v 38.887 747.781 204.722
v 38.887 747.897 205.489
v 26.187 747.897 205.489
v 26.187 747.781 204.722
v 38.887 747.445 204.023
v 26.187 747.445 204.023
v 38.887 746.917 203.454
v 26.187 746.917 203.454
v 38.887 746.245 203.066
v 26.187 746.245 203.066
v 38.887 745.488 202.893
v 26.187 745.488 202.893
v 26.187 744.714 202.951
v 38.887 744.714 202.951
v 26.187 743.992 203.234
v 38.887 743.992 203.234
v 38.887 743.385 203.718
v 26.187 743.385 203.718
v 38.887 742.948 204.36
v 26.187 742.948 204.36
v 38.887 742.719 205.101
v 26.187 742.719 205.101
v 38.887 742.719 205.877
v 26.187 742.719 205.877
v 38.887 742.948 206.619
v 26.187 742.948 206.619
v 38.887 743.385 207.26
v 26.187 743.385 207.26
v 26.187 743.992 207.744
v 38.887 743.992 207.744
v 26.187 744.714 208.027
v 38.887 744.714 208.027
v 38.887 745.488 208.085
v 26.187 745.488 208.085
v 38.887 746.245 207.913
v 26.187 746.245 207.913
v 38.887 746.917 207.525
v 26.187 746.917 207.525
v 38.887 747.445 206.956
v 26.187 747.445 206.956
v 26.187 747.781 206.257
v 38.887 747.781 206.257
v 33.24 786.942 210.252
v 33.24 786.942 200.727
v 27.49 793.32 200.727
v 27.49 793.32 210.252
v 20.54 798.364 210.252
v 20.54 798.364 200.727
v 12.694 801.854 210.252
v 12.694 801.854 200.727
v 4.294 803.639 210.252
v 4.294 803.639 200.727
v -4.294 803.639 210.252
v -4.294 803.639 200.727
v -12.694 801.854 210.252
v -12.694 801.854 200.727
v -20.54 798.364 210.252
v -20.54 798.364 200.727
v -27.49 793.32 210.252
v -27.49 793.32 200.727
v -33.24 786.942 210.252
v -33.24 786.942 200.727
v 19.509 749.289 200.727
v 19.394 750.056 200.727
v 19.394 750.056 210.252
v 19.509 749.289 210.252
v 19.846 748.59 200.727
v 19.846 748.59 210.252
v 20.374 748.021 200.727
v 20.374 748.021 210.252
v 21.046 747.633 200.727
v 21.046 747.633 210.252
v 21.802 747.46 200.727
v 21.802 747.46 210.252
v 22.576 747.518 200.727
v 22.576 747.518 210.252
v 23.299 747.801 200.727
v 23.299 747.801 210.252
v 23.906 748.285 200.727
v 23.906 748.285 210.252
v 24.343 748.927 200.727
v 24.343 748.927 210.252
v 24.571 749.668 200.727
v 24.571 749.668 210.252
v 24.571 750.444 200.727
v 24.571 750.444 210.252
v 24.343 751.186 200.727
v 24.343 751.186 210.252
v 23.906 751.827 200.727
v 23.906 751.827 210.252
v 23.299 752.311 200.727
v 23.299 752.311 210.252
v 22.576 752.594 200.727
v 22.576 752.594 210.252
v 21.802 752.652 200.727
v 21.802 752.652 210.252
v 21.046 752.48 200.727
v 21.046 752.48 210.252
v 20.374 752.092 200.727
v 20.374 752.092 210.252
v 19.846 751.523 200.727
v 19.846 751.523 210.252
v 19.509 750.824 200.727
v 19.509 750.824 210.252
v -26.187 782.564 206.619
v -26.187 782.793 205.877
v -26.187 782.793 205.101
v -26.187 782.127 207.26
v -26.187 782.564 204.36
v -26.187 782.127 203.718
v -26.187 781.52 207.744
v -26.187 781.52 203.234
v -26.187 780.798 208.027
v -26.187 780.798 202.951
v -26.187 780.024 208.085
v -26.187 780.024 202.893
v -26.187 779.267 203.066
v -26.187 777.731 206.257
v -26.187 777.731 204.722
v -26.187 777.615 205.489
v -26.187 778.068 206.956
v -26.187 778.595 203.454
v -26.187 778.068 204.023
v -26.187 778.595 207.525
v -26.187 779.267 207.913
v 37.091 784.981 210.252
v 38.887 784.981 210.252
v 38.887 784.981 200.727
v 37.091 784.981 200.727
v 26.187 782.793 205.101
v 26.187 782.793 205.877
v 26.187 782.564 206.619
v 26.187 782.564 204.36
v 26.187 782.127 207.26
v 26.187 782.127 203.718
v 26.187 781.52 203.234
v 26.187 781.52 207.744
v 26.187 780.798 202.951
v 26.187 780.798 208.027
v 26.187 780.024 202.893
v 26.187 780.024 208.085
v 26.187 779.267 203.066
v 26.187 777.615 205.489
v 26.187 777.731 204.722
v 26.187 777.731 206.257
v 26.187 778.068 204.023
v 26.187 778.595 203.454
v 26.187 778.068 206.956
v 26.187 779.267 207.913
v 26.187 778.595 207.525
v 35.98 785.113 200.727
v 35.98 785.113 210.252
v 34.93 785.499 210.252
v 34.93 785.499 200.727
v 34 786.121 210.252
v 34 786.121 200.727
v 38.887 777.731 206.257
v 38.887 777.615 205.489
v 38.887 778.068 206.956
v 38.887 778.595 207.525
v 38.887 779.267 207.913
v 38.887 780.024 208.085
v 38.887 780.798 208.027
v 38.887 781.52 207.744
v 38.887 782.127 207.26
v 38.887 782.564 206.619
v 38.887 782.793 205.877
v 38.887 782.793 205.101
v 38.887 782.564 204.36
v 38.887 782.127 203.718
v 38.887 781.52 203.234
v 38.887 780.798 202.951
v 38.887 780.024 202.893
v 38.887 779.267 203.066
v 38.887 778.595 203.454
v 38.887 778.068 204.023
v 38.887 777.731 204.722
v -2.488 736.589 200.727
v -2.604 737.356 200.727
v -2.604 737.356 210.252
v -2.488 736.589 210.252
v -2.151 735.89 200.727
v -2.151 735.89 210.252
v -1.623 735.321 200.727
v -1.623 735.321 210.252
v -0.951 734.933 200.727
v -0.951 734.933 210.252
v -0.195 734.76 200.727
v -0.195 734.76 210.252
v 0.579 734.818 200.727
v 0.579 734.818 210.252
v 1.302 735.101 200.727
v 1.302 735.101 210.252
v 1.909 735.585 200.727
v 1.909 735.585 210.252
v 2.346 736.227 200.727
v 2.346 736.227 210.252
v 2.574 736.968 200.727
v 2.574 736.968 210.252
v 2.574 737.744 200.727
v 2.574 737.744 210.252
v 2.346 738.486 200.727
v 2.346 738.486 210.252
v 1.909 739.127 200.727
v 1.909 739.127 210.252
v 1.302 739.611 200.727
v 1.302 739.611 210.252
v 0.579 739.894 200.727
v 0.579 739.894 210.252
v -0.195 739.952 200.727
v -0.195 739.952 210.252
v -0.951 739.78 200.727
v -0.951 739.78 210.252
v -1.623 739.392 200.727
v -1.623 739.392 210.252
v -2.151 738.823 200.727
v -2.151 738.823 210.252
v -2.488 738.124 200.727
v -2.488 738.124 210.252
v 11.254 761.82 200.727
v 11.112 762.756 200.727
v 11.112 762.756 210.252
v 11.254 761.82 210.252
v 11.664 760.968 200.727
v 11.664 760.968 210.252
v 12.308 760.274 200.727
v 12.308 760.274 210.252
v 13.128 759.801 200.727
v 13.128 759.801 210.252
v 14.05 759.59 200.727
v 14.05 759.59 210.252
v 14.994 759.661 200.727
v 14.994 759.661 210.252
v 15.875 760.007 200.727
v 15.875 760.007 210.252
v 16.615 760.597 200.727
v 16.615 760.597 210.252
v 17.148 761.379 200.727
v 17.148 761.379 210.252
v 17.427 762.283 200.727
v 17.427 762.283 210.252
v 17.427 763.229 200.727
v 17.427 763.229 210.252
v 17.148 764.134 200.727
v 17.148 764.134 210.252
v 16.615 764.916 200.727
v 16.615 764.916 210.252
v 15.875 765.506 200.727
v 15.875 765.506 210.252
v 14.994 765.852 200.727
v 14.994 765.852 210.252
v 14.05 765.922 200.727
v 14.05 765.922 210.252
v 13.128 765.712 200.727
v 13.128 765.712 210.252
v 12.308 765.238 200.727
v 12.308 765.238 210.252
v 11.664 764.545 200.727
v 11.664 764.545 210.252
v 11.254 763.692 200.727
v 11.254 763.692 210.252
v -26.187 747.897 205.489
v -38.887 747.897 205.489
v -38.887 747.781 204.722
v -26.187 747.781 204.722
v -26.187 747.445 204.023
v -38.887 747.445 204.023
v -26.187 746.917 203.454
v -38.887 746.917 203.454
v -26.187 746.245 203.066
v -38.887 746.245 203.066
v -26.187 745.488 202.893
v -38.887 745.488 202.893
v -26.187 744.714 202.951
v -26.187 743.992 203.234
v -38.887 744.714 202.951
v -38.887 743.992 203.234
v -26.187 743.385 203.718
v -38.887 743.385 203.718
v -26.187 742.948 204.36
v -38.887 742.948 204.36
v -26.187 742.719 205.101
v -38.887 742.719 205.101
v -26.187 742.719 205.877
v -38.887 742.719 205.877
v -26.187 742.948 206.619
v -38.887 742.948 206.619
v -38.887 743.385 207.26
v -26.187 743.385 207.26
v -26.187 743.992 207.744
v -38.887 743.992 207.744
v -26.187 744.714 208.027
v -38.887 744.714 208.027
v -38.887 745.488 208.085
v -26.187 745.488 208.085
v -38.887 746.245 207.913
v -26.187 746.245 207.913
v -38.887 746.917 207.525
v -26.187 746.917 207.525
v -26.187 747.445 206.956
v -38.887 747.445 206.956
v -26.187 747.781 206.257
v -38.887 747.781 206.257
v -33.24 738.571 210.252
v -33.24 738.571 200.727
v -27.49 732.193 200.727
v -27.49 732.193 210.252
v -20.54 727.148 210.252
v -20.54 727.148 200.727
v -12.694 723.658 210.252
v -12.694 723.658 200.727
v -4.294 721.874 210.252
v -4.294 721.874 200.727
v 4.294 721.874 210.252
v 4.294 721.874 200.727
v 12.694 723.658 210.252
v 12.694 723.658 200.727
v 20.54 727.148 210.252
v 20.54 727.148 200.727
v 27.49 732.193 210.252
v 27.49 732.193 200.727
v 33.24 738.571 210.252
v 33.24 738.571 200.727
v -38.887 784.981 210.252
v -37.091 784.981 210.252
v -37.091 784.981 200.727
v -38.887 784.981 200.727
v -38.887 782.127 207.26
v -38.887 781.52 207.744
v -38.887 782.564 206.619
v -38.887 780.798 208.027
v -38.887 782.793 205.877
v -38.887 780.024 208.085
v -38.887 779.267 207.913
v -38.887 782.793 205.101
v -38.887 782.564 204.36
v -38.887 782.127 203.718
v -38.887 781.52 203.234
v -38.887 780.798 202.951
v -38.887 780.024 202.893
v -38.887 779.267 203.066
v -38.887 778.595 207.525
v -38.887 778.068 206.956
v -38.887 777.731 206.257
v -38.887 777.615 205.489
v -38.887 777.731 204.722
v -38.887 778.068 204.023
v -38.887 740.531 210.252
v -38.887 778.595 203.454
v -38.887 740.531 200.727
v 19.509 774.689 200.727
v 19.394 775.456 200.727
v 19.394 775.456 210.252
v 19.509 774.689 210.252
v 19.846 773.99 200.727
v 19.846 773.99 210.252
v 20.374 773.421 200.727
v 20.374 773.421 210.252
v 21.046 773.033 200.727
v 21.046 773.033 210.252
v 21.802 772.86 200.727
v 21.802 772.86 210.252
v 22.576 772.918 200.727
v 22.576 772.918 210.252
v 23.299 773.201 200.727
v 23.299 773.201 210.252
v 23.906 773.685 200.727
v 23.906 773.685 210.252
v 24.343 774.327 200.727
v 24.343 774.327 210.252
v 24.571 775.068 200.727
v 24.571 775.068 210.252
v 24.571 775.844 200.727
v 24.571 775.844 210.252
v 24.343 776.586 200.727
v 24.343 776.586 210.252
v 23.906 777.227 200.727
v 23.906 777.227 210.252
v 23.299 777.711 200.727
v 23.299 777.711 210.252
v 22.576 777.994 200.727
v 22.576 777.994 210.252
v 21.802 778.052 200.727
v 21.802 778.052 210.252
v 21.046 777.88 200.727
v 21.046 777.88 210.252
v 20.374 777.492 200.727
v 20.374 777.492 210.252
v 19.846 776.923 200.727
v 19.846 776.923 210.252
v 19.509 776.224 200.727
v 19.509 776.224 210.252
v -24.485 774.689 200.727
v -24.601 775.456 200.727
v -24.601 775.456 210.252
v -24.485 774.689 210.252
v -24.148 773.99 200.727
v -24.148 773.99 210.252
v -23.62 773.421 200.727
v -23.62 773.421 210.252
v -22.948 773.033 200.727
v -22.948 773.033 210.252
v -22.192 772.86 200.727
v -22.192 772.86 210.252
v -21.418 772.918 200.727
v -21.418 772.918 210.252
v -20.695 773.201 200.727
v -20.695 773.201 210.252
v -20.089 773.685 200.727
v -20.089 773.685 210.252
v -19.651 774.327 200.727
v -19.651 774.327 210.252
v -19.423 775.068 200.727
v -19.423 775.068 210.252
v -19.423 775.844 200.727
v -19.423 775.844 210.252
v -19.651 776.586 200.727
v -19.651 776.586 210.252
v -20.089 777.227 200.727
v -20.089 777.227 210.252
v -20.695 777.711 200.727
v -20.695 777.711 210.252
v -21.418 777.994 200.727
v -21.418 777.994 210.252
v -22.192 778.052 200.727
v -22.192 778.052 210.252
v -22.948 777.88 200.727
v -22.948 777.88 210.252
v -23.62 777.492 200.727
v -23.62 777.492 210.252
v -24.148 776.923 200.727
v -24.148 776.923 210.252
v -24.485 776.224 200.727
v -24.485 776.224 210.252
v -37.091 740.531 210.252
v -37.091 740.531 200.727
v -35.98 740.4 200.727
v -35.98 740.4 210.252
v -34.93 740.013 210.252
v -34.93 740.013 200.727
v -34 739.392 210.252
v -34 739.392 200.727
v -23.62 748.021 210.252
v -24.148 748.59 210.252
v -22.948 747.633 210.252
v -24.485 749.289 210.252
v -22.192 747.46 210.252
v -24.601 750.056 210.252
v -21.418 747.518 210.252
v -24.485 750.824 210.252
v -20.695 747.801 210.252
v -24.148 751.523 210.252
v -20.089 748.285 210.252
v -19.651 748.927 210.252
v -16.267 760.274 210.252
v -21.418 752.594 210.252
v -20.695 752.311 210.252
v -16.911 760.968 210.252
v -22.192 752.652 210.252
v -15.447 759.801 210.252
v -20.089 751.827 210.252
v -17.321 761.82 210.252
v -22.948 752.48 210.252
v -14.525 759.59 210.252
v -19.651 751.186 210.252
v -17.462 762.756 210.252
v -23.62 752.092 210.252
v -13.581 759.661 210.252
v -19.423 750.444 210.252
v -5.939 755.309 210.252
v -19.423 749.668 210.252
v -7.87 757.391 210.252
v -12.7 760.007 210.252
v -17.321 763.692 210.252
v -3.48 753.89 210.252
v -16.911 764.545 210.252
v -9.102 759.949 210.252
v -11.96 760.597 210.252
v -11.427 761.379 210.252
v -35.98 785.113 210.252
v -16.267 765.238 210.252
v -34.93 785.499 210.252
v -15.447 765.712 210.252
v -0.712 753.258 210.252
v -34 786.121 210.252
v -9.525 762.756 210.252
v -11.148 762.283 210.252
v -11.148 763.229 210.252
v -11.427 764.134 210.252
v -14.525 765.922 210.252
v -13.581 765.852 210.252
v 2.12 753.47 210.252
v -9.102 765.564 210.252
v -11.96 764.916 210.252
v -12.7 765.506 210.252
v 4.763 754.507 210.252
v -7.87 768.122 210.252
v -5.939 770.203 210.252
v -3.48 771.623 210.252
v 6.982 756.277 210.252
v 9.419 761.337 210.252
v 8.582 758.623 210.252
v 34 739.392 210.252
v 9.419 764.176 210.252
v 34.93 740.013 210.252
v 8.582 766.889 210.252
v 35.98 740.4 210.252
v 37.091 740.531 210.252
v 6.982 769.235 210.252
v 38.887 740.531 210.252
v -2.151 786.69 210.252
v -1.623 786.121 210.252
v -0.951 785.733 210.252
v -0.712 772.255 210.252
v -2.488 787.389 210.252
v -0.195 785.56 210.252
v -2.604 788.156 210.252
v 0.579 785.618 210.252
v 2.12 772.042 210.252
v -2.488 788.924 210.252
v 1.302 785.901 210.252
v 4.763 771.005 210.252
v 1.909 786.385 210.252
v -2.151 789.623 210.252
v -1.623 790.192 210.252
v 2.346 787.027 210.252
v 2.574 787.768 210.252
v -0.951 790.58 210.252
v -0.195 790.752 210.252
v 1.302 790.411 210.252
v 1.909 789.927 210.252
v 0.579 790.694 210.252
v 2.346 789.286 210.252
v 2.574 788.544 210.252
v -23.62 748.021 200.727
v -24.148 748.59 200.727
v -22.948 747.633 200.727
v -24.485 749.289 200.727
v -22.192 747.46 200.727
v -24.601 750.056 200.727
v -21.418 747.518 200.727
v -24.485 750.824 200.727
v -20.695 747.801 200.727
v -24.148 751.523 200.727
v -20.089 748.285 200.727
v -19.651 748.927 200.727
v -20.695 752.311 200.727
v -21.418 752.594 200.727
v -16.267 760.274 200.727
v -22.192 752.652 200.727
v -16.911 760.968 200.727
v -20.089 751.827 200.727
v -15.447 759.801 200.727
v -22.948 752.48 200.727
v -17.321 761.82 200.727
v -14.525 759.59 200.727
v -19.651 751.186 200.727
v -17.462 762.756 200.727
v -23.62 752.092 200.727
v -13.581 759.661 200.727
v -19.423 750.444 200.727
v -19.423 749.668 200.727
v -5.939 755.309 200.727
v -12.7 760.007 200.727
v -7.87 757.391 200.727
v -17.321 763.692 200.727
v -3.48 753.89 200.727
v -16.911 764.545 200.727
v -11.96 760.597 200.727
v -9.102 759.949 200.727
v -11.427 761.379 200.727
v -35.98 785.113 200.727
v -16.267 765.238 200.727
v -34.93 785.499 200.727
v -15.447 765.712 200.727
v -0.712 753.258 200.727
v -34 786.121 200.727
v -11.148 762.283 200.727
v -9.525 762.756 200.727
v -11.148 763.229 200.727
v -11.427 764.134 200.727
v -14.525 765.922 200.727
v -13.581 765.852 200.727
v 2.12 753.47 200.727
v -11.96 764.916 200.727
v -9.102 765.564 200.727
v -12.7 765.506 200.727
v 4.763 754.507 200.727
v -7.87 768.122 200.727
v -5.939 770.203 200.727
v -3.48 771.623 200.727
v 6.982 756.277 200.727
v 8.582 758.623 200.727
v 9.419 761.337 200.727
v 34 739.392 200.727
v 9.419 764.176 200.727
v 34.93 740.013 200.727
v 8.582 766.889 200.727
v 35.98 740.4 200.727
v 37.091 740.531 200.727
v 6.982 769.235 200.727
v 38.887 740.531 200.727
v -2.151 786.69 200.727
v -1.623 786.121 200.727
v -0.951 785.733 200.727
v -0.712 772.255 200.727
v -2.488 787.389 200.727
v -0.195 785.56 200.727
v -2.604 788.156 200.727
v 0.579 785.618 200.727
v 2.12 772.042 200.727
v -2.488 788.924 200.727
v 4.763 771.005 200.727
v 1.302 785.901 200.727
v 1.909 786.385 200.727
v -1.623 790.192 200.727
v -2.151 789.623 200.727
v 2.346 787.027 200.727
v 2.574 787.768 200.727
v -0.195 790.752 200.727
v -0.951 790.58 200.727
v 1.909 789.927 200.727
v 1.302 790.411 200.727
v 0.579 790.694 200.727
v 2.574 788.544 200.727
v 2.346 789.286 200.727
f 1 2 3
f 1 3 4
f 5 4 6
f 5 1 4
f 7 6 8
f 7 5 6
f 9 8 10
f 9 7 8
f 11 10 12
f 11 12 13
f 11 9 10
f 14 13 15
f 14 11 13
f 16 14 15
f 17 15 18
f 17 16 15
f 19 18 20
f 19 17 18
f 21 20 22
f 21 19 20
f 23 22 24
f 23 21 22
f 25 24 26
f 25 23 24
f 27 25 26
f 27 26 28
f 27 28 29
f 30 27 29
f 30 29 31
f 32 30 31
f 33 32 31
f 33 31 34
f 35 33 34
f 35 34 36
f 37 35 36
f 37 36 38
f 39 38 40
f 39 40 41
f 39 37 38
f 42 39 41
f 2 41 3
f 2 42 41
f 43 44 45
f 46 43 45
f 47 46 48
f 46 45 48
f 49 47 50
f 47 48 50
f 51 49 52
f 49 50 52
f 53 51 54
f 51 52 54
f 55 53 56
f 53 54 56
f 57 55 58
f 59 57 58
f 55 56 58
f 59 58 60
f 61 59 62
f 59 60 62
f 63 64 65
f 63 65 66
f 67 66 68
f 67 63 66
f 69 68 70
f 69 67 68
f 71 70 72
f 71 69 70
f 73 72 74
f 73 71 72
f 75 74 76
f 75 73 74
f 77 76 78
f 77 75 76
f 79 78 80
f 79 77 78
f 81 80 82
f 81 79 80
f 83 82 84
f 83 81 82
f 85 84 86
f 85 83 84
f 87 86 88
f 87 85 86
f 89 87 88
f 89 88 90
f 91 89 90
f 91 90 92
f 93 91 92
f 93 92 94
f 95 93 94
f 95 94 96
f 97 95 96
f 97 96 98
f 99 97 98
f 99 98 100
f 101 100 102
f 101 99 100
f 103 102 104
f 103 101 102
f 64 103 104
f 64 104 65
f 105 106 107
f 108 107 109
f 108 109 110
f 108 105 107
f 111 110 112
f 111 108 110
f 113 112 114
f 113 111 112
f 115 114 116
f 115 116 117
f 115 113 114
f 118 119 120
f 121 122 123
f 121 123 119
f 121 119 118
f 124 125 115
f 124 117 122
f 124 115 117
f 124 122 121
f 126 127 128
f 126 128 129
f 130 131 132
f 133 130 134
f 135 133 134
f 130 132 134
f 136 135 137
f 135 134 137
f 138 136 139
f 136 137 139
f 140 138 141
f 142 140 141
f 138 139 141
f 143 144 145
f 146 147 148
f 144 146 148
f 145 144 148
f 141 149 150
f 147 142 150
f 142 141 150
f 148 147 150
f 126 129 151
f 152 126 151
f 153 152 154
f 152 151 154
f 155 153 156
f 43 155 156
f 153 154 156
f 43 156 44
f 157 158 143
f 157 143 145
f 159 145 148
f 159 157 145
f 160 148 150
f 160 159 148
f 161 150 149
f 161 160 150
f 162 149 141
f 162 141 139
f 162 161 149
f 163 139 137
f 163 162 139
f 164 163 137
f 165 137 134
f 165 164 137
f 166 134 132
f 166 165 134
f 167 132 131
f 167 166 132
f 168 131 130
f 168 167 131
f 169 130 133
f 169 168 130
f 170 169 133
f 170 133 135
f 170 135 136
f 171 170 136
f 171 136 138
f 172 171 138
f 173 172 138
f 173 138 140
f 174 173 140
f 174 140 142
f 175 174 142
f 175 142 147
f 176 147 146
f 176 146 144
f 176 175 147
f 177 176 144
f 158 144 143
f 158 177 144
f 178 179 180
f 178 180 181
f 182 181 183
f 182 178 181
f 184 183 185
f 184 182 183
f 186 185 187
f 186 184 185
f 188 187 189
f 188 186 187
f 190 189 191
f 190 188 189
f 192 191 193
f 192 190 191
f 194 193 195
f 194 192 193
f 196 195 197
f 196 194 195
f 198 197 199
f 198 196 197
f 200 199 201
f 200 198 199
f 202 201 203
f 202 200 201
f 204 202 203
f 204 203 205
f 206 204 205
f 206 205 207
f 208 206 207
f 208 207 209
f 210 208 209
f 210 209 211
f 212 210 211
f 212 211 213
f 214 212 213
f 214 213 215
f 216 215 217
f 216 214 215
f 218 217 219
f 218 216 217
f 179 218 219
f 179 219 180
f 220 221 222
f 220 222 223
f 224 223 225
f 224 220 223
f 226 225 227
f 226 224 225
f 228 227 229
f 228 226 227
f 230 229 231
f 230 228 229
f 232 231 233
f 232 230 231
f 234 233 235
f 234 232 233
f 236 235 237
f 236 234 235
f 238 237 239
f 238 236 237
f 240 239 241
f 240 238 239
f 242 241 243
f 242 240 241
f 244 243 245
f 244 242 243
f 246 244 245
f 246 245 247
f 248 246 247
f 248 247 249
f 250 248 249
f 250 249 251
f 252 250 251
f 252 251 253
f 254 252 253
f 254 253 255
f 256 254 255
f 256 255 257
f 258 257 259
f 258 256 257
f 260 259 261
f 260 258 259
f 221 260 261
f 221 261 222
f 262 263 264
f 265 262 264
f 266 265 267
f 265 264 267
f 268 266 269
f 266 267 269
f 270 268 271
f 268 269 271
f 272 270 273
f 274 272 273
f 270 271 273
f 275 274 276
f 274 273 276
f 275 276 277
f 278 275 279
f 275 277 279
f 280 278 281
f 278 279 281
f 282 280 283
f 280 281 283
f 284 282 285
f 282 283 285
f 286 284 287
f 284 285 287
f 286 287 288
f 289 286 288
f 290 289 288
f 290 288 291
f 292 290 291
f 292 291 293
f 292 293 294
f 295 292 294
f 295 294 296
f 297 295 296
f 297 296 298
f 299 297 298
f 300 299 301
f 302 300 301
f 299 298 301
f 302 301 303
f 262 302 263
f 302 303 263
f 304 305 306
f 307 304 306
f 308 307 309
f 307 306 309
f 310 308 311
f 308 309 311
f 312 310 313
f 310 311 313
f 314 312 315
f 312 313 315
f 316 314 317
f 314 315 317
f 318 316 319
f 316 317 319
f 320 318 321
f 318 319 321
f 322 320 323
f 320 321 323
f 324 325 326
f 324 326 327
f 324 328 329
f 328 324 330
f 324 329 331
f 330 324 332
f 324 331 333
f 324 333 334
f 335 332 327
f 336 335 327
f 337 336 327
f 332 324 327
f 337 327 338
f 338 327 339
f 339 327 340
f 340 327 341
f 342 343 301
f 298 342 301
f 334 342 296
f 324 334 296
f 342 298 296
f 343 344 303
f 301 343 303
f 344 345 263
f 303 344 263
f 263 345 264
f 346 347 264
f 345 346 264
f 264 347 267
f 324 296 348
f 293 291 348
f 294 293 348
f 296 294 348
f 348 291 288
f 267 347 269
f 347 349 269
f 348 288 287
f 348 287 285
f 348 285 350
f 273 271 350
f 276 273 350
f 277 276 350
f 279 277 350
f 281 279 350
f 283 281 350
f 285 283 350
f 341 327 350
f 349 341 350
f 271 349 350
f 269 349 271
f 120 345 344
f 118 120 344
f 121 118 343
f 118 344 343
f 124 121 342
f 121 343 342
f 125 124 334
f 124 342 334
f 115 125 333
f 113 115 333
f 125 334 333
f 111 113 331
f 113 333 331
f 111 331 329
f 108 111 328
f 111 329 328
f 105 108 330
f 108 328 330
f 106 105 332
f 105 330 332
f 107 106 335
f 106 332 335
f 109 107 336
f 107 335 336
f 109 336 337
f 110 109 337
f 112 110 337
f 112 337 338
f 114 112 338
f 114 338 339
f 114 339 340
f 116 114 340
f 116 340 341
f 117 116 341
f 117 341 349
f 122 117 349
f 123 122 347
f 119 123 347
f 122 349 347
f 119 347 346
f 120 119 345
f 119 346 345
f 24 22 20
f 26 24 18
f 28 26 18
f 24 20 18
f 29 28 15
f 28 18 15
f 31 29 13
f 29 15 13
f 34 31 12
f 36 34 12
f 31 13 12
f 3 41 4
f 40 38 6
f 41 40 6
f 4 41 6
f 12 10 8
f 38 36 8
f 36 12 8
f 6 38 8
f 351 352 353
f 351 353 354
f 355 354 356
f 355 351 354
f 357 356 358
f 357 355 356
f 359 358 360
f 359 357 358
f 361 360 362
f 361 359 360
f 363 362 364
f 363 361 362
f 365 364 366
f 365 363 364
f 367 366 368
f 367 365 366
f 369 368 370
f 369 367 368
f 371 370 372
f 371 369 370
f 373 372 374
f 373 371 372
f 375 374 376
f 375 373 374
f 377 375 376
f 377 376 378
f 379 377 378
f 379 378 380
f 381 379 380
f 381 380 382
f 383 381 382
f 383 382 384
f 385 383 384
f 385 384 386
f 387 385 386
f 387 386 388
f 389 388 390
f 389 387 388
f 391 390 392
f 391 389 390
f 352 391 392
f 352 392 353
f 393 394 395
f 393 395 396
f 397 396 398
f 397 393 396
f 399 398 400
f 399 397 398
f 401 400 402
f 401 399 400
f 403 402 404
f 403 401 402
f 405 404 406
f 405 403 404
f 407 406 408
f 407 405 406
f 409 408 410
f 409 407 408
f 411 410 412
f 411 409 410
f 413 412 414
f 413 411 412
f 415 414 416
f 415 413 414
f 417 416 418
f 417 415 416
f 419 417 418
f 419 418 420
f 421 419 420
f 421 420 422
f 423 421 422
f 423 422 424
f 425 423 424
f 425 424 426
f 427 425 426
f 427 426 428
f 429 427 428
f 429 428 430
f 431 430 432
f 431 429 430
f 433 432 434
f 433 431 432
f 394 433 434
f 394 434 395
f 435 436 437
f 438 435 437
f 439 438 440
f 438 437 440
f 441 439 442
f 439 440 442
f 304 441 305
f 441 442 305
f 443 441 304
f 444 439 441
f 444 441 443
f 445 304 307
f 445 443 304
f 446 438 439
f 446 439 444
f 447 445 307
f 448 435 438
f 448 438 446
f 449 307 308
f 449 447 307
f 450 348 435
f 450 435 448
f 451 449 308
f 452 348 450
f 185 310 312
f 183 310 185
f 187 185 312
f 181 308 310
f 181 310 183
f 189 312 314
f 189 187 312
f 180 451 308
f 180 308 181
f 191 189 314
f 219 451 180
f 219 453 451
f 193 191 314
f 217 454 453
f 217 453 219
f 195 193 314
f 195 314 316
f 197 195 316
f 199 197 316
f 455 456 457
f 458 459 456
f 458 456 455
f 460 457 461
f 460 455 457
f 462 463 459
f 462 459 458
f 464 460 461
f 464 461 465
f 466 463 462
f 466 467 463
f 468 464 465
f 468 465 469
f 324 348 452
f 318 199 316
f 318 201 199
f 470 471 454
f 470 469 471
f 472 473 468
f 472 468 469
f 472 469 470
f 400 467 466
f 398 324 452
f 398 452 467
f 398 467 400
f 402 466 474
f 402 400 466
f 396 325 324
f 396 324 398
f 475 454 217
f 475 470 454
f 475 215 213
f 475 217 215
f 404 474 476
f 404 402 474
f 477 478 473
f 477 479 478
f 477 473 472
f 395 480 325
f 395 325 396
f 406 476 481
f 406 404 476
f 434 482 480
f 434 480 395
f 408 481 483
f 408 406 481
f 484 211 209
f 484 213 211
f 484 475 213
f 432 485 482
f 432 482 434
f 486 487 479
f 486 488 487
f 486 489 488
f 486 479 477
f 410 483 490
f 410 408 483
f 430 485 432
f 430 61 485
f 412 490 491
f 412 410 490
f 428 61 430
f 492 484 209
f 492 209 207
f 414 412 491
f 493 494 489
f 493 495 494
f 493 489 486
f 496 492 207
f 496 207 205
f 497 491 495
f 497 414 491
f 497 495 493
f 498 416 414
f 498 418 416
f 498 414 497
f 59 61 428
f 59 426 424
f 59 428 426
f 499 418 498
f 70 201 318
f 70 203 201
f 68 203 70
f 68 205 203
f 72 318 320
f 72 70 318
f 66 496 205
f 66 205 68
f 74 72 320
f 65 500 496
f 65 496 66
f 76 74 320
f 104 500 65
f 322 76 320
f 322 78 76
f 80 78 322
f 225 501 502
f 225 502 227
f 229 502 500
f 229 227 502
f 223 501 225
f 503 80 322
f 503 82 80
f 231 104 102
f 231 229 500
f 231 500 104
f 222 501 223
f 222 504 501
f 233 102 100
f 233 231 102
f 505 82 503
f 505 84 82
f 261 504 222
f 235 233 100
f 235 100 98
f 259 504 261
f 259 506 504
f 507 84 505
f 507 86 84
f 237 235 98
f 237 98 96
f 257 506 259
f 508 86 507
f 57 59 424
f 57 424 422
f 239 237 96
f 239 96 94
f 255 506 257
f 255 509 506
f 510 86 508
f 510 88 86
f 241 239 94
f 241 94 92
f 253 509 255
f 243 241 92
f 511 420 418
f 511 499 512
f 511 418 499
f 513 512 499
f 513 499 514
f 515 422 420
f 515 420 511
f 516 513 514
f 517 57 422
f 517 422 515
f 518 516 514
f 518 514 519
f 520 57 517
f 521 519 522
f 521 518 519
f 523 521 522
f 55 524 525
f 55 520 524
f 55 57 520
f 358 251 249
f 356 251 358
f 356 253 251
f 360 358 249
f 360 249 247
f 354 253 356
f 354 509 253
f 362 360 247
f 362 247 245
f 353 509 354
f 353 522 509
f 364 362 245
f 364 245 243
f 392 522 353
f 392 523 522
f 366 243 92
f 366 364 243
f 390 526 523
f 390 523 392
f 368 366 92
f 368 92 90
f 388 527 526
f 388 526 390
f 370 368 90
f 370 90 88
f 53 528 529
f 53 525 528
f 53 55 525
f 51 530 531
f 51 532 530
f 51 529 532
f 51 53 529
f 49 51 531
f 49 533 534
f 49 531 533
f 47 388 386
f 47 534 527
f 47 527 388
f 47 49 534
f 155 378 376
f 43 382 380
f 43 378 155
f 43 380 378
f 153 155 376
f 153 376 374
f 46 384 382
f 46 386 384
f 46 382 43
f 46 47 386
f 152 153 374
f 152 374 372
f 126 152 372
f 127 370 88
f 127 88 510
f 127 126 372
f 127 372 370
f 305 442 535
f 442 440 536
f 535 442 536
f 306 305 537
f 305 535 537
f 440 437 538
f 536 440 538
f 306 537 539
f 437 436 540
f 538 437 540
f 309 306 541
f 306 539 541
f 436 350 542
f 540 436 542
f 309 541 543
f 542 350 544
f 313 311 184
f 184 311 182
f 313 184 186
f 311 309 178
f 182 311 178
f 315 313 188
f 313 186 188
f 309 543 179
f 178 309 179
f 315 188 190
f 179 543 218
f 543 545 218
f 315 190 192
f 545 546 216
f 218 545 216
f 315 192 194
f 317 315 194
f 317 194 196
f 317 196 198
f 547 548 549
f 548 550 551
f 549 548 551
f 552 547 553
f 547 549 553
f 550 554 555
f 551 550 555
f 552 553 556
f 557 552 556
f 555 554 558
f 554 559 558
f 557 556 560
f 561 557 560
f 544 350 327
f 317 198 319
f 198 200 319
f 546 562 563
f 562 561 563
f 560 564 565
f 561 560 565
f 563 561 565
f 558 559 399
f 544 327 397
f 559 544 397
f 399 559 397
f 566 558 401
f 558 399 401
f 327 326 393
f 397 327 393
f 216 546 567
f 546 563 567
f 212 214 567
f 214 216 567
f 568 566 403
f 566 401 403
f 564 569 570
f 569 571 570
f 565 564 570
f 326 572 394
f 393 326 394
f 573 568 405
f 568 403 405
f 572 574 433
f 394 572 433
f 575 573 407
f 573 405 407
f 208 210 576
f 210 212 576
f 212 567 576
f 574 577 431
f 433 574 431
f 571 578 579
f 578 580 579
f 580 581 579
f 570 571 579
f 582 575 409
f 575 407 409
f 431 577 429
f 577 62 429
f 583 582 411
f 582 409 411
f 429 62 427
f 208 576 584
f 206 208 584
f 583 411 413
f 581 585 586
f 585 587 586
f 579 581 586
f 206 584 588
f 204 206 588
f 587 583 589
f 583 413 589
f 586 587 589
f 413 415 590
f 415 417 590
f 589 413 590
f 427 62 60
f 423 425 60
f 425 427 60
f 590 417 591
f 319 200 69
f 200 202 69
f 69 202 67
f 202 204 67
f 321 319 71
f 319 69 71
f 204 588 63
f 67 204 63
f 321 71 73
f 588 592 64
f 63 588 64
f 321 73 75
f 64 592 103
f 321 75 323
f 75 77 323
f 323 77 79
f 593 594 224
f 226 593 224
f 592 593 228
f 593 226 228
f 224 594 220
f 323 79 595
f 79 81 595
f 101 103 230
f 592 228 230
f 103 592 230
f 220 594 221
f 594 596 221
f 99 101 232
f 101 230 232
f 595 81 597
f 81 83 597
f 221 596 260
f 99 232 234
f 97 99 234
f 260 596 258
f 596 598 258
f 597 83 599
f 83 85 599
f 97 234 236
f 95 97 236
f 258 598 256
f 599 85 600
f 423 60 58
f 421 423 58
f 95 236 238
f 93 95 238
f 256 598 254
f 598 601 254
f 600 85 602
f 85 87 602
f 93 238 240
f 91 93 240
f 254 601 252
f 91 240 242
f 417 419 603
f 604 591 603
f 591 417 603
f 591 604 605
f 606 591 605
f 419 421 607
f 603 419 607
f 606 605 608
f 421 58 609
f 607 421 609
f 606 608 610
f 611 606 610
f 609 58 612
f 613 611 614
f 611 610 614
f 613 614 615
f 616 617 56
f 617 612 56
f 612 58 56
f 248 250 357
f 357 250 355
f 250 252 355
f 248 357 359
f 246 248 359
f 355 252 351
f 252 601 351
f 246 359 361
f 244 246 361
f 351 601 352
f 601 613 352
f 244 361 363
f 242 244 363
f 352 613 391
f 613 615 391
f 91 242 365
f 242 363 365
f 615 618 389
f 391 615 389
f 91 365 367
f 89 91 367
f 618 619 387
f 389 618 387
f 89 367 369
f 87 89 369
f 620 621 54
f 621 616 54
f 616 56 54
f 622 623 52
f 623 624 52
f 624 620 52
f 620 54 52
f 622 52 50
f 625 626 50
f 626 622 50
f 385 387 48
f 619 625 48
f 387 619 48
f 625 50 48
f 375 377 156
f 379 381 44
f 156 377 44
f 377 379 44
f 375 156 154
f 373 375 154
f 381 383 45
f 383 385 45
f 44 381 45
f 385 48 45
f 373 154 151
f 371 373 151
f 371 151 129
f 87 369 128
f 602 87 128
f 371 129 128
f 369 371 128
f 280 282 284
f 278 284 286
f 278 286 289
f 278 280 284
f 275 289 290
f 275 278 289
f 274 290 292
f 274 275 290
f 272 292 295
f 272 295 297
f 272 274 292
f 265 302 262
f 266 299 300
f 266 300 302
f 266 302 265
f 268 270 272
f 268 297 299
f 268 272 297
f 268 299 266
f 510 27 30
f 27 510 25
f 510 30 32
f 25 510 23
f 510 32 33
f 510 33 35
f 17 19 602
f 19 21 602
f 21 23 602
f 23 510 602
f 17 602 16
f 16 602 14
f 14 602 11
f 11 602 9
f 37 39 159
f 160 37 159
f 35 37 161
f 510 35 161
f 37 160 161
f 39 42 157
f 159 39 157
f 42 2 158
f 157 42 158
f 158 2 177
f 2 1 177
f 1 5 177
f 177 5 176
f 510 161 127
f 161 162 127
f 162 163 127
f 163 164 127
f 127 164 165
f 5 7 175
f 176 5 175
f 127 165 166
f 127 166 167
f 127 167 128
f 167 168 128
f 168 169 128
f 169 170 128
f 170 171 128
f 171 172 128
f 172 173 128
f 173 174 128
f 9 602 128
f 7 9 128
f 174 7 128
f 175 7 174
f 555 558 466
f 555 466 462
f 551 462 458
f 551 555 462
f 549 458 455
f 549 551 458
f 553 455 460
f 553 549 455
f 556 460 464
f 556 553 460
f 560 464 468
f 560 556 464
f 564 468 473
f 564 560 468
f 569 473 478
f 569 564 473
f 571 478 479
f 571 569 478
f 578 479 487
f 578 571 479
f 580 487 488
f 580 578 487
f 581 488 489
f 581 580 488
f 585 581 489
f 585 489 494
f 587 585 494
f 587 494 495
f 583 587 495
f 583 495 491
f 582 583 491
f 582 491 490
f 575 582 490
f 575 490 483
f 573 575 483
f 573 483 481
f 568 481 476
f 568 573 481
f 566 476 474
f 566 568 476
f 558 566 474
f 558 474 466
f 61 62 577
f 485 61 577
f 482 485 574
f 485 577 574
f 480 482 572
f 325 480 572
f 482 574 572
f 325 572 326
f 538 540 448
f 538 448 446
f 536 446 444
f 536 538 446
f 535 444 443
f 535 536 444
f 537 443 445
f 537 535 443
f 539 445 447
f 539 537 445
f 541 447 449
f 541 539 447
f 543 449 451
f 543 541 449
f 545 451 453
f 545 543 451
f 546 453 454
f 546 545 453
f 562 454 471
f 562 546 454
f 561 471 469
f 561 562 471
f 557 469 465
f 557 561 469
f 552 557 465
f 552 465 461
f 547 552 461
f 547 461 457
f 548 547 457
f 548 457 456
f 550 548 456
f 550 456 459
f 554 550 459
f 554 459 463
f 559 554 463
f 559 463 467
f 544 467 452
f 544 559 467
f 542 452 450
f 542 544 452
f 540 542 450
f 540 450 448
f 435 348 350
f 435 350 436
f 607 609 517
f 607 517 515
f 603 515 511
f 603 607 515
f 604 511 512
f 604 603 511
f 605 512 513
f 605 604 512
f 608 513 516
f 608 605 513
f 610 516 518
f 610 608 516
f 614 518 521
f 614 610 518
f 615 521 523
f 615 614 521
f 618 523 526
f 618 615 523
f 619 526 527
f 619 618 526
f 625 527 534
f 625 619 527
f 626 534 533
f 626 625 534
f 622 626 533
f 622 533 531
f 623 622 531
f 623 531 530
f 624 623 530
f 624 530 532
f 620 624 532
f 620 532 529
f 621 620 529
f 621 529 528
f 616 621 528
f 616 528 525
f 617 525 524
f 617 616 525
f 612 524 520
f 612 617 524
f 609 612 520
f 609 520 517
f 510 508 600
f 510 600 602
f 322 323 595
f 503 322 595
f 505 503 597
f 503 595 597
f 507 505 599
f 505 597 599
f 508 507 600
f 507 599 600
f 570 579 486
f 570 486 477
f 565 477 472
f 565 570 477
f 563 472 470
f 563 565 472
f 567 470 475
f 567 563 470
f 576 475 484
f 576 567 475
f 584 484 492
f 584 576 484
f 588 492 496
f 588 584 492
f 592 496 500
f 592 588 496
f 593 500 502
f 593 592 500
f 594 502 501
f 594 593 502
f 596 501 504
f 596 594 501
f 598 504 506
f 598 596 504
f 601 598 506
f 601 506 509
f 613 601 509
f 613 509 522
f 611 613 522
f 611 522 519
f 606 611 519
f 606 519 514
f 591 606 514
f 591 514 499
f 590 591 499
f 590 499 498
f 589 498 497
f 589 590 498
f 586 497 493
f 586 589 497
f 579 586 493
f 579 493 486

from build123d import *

# Parameters (mm, degrees)
SKETCH1_R           = 3.175
SKETCH1_R_2         = 9.525
SKETCH1_R_3         = 2.6035
BOSS_EXTRUDE1_DEPTH = 9.525
SKETCH2_R           = 2.6035
CUT_EXTRUDE1_DEPTH  = 12.7


with BuildPart() as part:
    # Sketch1 → Boss-Extrude1 (new body)
    with BuildSketch(Plane.XY.offset(200.726675)):
        with BuildLine():
            Line((-37.090603219, 784.981140976), (-38.887083386, 784.981140976))
            Line((-38.887083386, 784.981140976), (-38.887083386, 740.531140976))
            Line((-38.887083386, 740.531140976), (-37.090603219, 740.531140976))
            ThreePointArc((-37.090603219, 740.531140976), (-34.929955448, 740.01281433), (-33.23961584, 738.570658545))
            ThreePointArc((-33.23961584, 738.570658545), (0, 721.648846957), (33.23961584, 738.570658545))
            ThreePointArc((33.23961584, 738.570658545), (34.929955448, 740.01281433), (37.090603219, 740.531140976))
            Line((37.090603219, 740.531140976), (38.887083386, 740.531140976))
            Line((38.887083386, 740.531140976), (38.887083386, 784.981140976))
            Line((38.887083386, 784.981140976), (37.090603219, 784.981140976))
            ThreePointArc((37.090603219, 784.981140976), (34.929955448, 785.499467621), (33.23961584, 786.941623406))
            ThreePointArc((33.23961584, 786.941623406), (0, 803.863434995), (-33.23961584, 786.941623406))
            ThreePointArc((-33.23961584, 786.941623406), (-34.929955448, 785.499467621), (-37.090603219, 784.981140976))
        make_face()
        with Locations(Location((14.2875, 762.756140976, 0), (0, 0, 180))):
            Circle(SKETCH1_R, mode=Mode.SUBTRACT)
        with Locations(Location((-14.2875, 762.756140976, 0), (0, 0, 180))):
            Circle(SKETCH1_R, mode=Mode.SUBTRACT)
        with Locations(Location((0, 762.756140976, 0), (0, 0, 180))):
            Circle(SKETCH1_R_2, mode=Mode.SUBTRACT)
        with Locations(Location((0, 788.156140976, 0), (0, 0, 180))):
            Circle(SKETCH1_R_3, mode=Mode.SUBTRACT)
        with Locations(Location((-21.997045256, 775.456140976, 0), (0, 0, 180))):
            Circle(SKETCH1_R_3, mode=Mode.SUBTRACT)
        with Locations(Location((-21.997045256, 750.056140976, 0), (0, 0, 180))):
            Circle(SKETCH1_R_3, mode=Mode.SUBTRACT)
        with Locations(Location((0, 737.356140976, 0), (0, 0, 180))):
            Circle(SKETCH1_R_3, mode=Mode.SUBTRACT)
        with Locations(Location((21.997045256, 750.056140976, 0), (0, 0, 180))):
            Circle(SKETCH1_R_3, mode=Mode.SUBTRACT)
        with Locations(Location((21.997045256, 775.456140976, 0), (0, 0, 180))):
            Circle(SKETCH1_R_3, mode=Mode.SUBTRACT)
    extrude(amount=BOSS_EXTRUDE1_DEPTH)

    # Sketch2 → Cut-Extrude1 (cut)
    with BuildSketch(Plane.ZY.offset(38.887083386)):
        with Locations(Location((205.489175, 780.218640976, 0), (0, 0, 270))):
            Circle(SKETCH2_R)
        with Locations(Location((205.489175, 745.293640976, 0), (0, 0, 90))):
            Circle(SKETCH2_R)
    cut_extrude1 = extrude(amount=-CUT_EXTRUDE1_DEPTH, mode=Mode.SUBTRACT)

    # Mirror1: Cut-Extrude1 across plane
    add(cut_extrude1.mirror(Plane(origin=(0, 0, 0), x_dir=(0, 0, 1), z_dir=(1, 0, 0))), mode=Mode.SUBTRACT)


solid = part.part
